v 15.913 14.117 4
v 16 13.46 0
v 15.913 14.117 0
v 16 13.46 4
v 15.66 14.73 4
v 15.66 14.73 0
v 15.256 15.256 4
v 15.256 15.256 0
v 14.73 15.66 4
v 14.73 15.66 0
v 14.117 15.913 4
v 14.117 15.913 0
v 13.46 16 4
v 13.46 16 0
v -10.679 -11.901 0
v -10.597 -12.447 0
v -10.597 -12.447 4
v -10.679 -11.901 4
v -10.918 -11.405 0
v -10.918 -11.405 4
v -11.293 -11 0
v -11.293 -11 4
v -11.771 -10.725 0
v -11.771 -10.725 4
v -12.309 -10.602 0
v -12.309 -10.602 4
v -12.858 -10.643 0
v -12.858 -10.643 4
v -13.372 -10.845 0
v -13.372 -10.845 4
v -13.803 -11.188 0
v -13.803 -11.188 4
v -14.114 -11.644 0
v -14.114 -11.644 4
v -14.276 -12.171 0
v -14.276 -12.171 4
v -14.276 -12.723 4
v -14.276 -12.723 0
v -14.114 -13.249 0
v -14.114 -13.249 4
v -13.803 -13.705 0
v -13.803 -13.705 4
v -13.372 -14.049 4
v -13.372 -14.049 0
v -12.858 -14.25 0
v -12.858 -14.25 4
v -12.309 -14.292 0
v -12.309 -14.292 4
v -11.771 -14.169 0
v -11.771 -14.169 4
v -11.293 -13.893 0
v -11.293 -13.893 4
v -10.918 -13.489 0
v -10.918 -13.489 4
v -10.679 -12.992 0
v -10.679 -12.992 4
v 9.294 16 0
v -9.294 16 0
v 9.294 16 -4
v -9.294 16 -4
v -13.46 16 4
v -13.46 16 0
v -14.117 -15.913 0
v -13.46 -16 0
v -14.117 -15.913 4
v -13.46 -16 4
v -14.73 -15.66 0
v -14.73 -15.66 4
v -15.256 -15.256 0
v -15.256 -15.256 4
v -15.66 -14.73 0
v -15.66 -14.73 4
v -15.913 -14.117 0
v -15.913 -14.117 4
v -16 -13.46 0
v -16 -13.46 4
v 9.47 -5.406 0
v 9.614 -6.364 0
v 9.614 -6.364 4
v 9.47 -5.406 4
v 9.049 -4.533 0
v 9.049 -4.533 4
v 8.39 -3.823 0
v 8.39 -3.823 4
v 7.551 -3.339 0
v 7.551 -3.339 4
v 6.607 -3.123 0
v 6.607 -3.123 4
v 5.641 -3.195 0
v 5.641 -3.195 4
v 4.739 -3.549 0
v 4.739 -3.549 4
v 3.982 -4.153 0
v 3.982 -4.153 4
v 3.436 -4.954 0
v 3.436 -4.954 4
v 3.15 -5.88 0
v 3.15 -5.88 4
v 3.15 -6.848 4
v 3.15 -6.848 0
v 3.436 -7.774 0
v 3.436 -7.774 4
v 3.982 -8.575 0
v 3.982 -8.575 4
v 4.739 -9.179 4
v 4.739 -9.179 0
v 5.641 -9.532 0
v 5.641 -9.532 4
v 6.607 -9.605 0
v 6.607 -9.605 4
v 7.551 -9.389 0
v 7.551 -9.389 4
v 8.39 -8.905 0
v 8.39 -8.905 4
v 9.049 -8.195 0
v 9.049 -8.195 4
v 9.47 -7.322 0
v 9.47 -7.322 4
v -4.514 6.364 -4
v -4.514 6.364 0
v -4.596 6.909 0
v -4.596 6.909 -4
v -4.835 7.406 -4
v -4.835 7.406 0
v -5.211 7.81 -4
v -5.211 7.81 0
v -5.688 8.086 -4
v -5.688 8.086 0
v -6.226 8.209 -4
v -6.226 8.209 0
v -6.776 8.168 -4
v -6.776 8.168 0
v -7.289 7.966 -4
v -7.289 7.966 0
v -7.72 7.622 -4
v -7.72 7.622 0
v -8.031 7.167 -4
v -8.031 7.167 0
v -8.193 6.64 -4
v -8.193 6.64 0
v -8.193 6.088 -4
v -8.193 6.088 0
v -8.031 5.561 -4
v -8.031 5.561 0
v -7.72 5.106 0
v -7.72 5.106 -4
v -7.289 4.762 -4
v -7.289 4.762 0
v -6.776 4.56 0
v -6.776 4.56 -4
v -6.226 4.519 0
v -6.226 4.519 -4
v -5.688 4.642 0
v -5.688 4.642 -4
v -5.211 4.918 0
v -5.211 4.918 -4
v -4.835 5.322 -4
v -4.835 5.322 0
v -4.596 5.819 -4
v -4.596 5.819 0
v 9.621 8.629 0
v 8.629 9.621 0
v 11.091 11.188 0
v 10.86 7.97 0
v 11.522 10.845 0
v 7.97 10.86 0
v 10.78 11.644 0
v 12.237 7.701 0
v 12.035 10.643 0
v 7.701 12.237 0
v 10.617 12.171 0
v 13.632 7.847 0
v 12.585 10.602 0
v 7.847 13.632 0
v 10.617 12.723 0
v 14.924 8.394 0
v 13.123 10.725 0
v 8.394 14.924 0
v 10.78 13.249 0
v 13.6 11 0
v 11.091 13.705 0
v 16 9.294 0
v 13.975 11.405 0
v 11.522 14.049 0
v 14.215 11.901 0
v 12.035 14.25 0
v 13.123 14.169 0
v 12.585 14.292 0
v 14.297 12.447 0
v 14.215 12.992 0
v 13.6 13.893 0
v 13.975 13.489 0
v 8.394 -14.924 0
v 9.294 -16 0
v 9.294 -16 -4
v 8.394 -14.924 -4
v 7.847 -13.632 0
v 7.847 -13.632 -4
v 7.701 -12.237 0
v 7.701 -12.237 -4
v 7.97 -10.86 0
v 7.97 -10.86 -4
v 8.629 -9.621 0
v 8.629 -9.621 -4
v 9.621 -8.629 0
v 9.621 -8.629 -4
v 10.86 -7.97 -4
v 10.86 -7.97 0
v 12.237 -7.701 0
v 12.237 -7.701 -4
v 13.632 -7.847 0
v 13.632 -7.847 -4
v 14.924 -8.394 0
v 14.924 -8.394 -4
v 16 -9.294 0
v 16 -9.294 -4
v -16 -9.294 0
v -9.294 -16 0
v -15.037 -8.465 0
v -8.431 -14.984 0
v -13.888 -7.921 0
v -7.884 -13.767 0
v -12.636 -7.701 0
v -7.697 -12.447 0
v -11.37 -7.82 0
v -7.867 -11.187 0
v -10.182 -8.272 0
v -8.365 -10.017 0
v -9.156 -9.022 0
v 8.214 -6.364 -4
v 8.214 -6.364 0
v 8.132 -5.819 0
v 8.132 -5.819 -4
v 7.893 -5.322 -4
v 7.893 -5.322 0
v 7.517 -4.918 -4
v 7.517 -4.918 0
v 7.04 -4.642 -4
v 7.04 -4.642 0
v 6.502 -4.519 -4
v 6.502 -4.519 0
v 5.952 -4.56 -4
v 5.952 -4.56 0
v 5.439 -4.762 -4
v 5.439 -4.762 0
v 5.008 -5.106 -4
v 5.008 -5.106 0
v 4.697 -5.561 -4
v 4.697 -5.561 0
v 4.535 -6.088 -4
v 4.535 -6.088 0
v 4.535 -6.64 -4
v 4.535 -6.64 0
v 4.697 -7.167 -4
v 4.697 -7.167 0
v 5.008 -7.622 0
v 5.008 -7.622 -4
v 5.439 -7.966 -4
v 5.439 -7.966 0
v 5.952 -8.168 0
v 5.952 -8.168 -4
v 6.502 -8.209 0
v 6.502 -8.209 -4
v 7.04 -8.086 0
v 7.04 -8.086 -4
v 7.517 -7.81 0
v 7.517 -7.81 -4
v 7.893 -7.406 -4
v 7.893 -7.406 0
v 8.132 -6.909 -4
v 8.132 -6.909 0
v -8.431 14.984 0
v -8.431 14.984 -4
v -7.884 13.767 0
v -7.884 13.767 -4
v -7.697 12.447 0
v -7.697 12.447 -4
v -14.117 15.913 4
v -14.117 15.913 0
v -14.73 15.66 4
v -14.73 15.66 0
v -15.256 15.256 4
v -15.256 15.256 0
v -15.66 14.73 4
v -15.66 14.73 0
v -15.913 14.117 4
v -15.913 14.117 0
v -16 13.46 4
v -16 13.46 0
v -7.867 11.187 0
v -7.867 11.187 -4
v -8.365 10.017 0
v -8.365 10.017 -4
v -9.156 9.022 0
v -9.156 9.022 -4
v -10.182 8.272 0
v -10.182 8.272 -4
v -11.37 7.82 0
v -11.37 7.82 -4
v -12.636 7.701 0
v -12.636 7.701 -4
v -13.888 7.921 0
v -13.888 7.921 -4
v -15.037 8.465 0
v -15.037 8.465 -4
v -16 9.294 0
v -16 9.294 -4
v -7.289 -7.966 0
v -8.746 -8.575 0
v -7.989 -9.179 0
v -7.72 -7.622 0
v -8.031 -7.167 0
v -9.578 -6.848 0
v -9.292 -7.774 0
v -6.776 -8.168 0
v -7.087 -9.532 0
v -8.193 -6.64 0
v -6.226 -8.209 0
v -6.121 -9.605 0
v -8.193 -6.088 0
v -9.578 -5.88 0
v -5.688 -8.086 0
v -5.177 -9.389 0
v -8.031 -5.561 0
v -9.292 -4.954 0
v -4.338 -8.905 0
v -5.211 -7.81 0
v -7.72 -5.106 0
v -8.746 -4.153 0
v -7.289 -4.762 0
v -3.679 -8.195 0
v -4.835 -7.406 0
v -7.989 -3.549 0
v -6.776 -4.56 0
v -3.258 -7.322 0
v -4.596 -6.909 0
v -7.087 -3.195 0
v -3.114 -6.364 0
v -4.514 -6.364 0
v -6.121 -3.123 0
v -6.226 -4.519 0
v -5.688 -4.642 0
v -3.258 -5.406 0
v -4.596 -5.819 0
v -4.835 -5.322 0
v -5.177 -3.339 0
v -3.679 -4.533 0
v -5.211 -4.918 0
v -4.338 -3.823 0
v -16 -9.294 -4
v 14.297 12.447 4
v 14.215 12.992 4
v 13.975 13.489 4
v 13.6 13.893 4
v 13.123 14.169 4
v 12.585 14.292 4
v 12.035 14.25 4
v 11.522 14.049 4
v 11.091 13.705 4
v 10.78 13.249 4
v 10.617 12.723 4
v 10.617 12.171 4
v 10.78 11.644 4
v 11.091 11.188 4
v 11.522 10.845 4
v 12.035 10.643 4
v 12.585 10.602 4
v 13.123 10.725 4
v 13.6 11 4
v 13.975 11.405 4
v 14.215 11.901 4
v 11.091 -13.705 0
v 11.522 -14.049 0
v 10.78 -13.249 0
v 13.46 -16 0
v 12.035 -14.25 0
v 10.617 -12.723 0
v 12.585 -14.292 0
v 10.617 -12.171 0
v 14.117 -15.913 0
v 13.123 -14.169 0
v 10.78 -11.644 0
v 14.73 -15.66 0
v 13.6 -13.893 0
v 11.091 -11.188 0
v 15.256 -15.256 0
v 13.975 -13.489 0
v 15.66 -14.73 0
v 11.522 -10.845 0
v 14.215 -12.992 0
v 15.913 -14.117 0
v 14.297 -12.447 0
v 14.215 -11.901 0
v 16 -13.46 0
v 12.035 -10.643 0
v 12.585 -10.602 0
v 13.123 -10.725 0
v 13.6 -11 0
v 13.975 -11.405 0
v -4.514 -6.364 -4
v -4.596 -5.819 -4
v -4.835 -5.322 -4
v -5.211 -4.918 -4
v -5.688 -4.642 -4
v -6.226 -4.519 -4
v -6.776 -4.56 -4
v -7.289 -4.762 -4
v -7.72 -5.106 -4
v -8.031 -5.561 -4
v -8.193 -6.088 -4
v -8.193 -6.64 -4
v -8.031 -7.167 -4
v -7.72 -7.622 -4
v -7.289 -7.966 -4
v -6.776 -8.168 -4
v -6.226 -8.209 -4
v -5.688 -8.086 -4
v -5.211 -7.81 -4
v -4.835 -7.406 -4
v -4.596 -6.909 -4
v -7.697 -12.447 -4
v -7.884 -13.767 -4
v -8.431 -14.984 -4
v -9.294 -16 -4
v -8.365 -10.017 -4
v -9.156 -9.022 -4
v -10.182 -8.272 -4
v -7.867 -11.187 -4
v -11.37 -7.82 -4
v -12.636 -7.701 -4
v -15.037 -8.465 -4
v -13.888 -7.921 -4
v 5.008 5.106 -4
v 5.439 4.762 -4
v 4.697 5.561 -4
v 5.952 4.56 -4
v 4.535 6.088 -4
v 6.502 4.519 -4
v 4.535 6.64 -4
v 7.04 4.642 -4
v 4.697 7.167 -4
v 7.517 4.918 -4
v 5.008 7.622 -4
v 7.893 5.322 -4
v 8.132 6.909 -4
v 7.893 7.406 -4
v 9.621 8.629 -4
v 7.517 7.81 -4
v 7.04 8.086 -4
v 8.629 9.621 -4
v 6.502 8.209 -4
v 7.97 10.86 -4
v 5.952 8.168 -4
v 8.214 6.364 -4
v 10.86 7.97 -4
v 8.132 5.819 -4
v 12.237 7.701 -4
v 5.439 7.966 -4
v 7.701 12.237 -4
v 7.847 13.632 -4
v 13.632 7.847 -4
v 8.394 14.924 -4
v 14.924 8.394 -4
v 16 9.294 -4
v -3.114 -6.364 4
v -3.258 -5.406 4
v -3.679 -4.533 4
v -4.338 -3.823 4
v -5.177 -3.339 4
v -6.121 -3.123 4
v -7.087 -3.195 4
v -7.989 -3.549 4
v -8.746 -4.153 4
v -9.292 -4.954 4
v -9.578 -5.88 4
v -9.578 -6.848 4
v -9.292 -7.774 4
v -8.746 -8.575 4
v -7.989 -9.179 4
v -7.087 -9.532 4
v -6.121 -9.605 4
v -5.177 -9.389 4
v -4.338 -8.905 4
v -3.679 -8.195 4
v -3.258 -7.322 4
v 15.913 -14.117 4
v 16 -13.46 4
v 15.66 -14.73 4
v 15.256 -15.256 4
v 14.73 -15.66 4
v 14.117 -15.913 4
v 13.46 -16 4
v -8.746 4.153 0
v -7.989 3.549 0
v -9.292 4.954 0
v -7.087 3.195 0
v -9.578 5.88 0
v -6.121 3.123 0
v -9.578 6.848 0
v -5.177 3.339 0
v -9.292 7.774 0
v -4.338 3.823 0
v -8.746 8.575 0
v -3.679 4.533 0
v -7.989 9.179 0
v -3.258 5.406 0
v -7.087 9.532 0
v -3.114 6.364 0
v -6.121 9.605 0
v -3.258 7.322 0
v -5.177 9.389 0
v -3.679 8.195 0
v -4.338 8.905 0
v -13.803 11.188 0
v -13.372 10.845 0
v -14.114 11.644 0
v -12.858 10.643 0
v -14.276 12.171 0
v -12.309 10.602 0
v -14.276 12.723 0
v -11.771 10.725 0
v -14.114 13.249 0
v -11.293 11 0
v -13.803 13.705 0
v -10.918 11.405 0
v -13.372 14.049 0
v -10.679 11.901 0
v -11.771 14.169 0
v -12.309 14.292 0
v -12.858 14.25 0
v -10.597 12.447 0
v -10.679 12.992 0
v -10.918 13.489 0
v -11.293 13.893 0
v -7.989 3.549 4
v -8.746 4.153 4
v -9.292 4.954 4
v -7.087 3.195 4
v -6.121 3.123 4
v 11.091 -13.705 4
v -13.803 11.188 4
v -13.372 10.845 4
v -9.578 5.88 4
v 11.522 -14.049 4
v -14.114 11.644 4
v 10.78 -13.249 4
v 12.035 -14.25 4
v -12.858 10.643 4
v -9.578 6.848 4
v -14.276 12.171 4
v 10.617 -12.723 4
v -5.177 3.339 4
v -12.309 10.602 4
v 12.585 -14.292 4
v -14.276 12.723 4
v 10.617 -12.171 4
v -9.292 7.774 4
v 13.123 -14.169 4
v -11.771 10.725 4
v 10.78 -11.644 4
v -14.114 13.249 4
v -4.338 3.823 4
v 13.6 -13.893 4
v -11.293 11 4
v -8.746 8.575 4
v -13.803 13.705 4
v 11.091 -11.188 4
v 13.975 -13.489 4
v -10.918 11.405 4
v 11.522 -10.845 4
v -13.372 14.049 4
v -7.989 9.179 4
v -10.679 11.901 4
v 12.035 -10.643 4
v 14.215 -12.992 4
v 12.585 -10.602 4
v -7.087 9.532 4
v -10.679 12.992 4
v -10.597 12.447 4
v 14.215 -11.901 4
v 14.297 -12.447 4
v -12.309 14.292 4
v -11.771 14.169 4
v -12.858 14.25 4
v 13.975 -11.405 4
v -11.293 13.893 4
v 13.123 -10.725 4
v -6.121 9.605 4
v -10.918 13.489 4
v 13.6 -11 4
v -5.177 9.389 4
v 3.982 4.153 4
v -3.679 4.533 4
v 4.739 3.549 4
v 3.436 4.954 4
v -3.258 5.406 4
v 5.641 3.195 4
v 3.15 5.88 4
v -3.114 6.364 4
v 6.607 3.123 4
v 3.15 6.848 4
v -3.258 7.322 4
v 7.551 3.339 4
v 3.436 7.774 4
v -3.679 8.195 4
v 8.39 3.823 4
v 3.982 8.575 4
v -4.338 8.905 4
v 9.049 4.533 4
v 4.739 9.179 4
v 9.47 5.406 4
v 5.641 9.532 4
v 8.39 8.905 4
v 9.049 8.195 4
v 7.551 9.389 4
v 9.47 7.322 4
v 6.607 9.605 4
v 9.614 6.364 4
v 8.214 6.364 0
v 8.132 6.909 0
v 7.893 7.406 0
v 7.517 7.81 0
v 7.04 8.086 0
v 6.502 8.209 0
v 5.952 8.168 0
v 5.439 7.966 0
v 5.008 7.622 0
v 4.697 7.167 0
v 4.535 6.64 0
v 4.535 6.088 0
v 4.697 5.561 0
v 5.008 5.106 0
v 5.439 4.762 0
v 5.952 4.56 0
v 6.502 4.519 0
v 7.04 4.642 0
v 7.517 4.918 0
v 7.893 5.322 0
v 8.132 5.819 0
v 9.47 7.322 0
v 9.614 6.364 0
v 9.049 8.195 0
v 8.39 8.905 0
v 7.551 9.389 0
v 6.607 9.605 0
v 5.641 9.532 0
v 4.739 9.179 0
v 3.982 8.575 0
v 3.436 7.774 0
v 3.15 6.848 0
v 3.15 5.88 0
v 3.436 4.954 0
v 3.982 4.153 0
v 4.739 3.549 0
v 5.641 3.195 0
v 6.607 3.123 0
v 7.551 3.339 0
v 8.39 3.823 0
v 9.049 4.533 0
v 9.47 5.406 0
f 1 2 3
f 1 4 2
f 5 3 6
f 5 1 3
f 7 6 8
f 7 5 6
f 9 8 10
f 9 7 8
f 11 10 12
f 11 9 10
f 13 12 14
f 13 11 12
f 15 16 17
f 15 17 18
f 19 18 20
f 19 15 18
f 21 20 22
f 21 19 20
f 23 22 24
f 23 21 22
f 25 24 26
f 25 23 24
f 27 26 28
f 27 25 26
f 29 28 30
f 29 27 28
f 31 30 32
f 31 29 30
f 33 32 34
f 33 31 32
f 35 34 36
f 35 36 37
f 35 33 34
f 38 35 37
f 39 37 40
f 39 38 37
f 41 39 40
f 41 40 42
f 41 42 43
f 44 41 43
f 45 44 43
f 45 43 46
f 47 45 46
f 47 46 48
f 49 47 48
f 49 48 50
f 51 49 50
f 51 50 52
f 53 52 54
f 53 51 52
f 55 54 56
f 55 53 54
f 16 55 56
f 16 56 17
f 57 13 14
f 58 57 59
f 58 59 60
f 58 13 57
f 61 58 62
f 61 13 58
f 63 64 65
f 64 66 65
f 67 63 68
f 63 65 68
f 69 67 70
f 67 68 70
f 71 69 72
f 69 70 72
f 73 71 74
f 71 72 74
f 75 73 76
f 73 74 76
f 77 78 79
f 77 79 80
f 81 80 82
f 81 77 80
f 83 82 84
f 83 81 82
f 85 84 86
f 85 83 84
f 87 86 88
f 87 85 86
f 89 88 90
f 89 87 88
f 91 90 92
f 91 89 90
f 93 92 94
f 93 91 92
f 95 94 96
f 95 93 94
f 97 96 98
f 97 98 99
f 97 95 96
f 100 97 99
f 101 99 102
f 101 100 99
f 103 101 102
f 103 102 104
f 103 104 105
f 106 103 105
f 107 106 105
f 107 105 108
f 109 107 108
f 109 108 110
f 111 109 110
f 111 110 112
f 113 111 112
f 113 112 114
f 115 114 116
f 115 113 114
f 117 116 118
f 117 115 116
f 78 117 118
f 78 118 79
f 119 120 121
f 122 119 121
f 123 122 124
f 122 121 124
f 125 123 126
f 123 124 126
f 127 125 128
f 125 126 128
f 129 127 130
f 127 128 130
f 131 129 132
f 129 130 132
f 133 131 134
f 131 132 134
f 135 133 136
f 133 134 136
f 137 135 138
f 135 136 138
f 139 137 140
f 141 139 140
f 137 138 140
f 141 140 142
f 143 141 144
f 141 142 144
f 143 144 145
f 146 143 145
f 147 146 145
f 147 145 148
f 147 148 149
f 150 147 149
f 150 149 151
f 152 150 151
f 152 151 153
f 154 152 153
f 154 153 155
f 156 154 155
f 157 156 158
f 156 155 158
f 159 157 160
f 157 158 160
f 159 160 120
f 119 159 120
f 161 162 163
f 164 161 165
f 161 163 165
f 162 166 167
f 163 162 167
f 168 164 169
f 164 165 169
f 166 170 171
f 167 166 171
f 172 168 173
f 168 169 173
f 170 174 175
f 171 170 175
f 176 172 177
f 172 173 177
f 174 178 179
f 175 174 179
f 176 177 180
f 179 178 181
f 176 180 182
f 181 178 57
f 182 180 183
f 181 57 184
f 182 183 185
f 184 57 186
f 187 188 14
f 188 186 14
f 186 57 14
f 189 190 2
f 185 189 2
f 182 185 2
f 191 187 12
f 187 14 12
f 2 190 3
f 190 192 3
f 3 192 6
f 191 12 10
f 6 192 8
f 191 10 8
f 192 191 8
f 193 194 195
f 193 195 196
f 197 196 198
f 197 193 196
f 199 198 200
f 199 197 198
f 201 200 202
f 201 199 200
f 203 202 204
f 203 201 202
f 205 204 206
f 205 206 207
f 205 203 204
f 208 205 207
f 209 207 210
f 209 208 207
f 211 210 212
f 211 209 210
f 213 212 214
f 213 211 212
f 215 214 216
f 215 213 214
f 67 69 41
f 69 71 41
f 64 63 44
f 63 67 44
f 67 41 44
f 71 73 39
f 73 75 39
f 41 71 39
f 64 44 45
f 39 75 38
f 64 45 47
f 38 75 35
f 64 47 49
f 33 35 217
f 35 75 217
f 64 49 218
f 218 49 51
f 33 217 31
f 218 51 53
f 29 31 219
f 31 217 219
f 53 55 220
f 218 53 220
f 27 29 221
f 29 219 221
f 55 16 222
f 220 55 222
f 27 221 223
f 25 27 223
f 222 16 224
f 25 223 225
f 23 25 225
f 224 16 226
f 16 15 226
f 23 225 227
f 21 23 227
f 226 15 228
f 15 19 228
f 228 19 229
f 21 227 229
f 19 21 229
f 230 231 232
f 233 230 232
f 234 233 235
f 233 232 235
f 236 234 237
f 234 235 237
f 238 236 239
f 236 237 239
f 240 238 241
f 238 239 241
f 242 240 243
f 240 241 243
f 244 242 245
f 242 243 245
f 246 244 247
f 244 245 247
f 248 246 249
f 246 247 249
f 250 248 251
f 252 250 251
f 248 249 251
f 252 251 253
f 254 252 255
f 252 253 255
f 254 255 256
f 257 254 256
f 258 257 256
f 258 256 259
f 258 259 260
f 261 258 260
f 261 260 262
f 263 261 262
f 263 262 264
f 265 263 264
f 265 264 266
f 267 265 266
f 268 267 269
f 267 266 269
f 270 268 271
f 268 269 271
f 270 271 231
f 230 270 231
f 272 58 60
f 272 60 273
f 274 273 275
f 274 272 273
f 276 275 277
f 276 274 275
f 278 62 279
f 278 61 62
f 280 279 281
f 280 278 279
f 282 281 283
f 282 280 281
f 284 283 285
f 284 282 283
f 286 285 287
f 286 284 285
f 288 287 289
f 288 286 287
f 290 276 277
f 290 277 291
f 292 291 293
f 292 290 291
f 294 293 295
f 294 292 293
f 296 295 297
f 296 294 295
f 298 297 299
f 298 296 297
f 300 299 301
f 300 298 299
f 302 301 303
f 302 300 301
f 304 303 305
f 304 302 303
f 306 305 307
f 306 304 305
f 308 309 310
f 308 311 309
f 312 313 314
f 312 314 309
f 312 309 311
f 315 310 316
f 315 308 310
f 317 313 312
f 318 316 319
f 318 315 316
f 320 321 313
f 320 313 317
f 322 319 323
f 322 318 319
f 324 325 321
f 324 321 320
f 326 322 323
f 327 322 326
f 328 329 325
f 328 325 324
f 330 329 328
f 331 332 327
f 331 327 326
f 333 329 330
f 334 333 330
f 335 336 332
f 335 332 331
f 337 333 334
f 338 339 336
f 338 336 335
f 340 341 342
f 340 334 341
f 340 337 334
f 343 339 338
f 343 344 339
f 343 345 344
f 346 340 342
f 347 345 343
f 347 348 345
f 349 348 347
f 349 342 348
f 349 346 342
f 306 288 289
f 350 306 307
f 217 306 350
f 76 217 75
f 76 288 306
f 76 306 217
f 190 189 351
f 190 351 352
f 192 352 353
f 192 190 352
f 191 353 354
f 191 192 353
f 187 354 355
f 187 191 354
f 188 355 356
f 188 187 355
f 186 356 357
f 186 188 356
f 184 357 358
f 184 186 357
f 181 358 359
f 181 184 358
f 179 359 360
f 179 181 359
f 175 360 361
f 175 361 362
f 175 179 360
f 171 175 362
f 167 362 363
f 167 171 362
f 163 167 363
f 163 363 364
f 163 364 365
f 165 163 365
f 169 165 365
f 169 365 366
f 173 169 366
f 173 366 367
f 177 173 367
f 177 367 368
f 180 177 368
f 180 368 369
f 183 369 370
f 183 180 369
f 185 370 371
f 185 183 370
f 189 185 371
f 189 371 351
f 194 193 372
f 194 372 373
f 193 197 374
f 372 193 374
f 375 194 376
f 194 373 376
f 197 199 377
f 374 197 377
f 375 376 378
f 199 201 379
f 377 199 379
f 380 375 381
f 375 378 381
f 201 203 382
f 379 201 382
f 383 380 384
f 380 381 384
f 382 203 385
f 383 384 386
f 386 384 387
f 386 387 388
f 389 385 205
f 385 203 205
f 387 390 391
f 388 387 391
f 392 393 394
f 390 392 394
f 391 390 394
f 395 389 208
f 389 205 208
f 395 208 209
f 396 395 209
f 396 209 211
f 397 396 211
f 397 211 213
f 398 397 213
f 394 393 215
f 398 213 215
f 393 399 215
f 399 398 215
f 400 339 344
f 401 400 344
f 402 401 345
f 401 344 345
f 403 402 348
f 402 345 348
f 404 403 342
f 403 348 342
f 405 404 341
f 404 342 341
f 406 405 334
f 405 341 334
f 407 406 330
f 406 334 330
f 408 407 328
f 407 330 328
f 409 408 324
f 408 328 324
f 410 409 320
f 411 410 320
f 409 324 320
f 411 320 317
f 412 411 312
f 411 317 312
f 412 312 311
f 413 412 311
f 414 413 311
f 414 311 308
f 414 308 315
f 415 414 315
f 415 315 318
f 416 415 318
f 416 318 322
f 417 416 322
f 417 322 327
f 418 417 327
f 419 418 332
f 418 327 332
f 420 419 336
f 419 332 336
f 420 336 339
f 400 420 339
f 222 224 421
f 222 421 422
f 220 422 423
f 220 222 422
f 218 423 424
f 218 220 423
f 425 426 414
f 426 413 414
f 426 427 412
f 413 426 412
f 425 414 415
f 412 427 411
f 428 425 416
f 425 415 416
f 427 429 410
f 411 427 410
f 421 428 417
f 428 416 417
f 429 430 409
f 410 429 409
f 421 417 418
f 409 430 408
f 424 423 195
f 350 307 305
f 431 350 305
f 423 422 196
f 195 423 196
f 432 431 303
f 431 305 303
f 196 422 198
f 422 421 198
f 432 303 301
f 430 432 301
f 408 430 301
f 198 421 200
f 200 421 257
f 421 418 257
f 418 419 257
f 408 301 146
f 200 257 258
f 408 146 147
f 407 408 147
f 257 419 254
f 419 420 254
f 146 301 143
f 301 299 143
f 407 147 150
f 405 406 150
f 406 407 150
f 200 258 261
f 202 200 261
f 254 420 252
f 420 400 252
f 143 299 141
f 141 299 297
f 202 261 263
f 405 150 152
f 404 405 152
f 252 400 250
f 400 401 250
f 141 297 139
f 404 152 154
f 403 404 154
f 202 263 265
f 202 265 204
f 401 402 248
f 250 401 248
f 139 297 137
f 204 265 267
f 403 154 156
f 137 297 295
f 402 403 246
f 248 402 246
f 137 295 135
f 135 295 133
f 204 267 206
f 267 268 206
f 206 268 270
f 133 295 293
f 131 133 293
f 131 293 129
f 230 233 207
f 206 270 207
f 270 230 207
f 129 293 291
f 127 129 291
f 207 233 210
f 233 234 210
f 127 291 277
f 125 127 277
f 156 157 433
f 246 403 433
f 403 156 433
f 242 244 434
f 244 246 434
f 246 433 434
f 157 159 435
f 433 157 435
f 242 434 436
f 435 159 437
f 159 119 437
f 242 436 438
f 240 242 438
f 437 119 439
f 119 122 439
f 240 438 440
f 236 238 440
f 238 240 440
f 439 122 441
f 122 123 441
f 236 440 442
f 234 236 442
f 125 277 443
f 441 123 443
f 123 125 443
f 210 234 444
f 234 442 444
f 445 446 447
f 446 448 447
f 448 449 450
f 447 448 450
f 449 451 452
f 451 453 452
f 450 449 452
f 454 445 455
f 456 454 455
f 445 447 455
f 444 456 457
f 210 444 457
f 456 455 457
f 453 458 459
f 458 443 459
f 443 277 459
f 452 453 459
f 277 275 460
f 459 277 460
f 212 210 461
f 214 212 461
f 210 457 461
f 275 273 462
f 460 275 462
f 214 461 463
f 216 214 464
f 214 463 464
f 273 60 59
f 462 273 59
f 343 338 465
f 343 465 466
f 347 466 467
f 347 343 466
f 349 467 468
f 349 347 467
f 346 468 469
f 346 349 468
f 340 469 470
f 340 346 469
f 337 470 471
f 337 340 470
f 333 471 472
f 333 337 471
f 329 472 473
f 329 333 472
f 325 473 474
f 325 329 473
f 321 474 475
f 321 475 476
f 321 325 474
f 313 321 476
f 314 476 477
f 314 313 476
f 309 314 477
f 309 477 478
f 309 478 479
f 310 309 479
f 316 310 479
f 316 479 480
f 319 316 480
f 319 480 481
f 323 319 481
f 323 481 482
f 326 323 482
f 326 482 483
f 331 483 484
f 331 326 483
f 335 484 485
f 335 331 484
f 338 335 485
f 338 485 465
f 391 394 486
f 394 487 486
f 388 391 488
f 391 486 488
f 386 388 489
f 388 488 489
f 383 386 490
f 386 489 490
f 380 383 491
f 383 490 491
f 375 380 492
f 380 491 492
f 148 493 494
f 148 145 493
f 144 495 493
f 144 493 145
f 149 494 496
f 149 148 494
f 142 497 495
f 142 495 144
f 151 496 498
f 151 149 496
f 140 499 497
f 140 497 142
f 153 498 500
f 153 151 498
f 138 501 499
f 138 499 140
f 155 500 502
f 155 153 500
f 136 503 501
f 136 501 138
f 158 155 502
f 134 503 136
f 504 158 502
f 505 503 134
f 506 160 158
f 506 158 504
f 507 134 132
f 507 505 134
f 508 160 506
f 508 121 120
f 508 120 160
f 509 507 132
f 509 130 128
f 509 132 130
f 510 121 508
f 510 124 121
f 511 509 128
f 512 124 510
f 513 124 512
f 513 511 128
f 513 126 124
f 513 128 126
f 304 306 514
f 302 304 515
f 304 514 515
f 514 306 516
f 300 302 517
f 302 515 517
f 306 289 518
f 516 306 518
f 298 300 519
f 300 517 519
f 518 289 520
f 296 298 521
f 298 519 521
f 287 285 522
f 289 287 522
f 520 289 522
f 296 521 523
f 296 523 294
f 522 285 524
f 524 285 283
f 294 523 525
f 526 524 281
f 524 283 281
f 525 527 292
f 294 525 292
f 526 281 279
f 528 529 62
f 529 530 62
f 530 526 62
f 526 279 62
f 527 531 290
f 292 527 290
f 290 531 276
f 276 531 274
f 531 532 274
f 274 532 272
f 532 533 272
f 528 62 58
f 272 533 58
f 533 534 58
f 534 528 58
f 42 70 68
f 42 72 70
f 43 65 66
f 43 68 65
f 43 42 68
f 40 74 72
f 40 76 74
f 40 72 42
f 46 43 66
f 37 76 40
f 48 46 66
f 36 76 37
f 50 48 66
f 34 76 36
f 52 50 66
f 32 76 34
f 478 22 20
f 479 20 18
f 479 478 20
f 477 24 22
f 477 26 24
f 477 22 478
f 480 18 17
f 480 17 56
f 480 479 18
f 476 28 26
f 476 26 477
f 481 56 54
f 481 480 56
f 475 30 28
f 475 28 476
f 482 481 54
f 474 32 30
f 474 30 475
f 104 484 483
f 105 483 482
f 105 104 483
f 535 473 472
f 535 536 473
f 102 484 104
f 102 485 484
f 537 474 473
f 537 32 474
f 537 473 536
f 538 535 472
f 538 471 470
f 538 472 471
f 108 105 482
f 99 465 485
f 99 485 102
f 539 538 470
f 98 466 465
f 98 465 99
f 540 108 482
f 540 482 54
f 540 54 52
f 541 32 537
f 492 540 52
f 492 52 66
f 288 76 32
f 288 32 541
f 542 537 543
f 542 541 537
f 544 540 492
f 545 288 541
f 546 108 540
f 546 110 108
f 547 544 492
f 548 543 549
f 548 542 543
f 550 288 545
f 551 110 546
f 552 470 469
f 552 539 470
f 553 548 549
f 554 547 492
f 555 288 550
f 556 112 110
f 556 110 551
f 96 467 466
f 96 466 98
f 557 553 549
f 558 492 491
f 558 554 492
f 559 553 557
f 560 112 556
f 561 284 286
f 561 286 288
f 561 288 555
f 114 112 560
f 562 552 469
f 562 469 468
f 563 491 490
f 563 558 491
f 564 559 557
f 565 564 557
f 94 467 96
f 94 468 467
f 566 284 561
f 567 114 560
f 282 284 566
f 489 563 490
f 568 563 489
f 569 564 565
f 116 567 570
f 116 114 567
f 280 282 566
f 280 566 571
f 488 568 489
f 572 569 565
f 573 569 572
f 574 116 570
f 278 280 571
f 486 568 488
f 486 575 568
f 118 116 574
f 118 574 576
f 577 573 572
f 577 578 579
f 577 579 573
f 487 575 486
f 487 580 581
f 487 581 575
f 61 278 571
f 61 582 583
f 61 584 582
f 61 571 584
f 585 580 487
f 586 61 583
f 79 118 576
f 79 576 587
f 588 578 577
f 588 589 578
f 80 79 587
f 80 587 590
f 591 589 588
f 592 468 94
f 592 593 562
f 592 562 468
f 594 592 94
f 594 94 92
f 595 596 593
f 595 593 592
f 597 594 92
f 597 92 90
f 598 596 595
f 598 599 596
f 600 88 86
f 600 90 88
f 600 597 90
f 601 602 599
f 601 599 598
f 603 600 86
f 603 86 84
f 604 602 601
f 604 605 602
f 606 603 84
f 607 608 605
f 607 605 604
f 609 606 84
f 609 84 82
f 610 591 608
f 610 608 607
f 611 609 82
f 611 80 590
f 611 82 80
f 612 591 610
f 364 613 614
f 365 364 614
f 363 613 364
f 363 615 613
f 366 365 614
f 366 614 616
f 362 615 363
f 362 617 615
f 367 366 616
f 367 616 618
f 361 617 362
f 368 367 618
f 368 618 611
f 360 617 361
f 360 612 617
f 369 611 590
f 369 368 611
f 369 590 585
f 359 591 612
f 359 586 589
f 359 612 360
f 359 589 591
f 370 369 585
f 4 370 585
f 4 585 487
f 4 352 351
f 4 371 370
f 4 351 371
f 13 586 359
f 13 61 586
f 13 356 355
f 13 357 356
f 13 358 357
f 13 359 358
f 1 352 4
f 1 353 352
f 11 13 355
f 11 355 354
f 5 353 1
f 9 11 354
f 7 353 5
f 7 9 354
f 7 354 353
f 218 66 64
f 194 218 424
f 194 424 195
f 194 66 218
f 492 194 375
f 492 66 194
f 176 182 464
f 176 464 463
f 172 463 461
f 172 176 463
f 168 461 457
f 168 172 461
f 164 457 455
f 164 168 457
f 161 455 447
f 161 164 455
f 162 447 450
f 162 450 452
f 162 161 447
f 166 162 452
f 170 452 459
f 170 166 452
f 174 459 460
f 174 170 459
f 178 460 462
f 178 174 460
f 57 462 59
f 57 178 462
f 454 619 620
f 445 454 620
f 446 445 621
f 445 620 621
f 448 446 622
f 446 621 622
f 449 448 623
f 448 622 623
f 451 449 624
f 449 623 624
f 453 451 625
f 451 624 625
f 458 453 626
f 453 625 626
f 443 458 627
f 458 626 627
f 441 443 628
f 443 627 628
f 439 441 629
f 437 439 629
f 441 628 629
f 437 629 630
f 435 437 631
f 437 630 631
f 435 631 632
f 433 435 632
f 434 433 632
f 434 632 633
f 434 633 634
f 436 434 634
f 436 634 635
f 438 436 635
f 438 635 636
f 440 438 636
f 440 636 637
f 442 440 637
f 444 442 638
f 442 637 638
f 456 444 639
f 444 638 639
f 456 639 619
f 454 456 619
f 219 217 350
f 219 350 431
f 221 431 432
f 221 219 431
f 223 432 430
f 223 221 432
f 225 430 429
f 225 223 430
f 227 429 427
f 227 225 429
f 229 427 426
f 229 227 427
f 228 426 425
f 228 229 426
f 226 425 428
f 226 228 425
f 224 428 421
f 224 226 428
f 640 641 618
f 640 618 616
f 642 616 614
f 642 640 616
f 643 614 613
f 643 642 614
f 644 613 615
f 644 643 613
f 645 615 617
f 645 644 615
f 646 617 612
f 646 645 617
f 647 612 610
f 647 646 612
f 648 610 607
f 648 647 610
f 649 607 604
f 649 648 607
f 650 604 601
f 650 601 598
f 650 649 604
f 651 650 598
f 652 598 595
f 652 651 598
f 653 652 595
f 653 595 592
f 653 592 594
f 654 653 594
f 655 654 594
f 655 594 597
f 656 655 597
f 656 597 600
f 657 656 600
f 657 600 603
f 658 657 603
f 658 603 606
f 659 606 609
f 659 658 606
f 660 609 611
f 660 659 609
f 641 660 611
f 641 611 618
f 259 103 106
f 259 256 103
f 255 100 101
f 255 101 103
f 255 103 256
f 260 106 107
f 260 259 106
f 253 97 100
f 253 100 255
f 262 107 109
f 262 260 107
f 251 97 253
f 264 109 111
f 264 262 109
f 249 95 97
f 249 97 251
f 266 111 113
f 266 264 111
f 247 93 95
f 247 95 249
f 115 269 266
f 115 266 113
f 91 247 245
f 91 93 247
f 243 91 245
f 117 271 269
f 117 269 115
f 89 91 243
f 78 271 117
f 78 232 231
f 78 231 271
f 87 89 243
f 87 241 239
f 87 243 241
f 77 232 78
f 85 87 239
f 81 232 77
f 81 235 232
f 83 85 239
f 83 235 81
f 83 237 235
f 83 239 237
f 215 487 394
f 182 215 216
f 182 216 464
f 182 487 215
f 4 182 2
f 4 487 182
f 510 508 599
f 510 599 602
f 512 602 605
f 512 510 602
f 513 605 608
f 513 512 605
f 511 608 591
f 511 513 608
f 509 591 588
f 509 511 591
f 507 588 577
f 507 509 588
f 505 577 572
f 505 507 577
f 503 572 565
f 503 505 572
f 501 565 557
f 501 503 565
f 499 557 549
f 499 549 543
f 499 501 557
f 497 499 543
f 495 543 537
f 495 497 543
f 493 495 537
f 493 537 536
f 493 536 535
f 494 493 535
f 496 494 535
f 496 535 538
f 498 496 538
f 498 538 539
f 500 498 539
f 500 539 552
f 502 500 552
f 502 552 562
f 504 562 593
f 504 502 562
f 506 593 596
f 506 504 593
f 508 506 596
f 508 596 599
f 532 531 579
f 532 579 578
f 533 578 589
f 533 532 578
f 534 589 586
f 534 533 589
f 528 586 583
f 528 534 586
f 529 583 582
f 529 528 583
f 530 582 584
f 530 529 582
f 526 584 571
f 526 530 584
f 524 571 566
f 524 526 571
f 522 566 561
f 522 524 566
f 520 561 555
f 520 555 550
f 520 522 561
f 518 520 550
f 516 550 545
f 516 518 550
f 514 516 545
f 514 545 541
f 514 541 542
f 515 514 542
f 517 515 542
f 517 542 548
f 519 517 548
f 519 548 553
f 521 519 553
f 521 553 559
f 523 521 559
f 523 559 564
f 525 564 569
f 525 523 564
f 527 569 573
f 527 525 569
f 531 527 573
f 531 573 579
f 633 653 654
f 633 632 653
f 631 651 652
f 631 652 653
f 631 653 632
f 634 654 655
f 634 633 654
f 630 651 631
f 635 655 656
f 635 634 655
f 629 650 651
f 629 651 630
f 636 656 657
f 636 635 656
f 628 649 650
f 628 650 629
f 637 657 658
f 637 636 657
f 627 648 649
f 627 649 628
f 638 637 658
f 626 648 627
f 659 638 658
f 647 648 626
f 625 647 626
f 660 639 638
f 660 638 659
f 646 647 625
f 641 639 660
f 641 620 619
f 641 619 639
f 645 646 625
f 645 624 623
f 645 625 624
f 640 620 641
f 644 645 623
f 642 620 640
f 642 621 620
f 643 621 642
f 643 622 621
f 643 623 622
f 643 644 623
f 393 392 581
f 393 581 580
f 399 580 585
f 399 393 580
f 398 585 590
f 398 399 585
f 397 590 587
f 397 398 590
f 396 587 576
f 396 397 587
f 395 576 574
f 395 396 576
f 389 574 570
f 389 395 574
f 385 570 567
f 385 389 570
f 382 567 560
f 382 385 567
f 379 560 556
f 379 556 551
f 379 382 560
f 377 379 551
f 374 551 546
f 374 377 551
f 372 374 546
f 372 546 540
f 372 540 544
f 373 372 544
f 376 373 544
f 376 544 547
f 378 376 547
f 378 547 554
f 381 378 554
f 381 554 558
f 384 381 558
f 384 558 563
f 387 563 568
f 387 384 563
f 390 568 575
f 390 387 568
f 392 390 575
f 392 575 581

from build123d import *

# Parameters (mm, degrees)
F0_R     = 3.25
F0_R_2   = 1.85
F1_DEPTH = 4
F2_DEPTH = 4
F3_R     = 2.54


with BuildPart() as f1:
    # F0 (on Top) → F1 (new body)
    with BuildSketch(Plane.XY):
        with BuildLine():
            ThreePointArc((16, 9.294458), (9.088031, 9.088031), (9.294458, 16))
            Line((9.294458, 16), (-9.294458, 16))
            ThreePointArc((-9.294458, 16), (-8.114579, 14.394727), (-7.696788, 12.446788))
            ThreePointArc((-7.696788, 12.446788), (-10.760855, 8.006053), (-16, 9.294458))
            Line((-16, 9.294458), (-16, -9.294458))
            ThreePointArc((-16, -9.294458), (-10.760855, -8.006053), (-7.696788, -12.446788))
            ThreePointArc((-7.696788, -12.446788), (-8.114579, -14.394727), (-9.294458, -16))
            Line((-9.294458, -16), (9.294458, -16))
            ThreePointArc((9.294458, -16), (9.088031, -9.088031), (16, -9.294458))
            Line((16, -9.294458), (16, 9.294458))
        make_face()
        with Locations((-6.363961, -6.363961)):
            Circle(F0_R, mode=Mode.SUBTRACT)
        with Locations((6.363961, -6.363961)):
            Circle(F0_R, mode=Mode.SUBTRACT)
        with Locations((-6.363961, 6.363961)):
            Circle(F0_R, mode=Mode.SUBTRACT)
        with Locations((6.363961, 6.363961)):
            Circle(F0_R, mode=Mode.SUBTRACT)
        with BuildLine():
            ThreePointArc((-7.696788, 12.446788), (-8.114579, 14.394727), (-9.294458, 16))
            Line((-9.294458, 16), (-15.599119, 16))
            ThreePointArc((-15.599119, 16), (-15.805546, 15.805546), (-16, 15.599119))
            Line((-16, 15.599119), (-16, 9.294458))
            ThreePointArc((-16, 9.294458), (-10.760855, 8.006053), (-7.696788, 12.446788))
        make_face()
        with Locations((-12.446788, 12.446788)):
            Circle(F0_R_2, mode=Mode.SUBTRACT)
        with BuildLine():
            ThreePointArc((16, 15.599119), (15.805546, 15.805546), (15.599119, 16))
            Line((15.599119, 16), (9.294458, 16))
            ThreePointArc((9.294458, 16), (9.088031, 9.088031), (16, 9.294458))
            Line((16, 9.294458), (16, 15.599119))
        make_face()
        with Locations((12.446788, 12.446788)):
            Circle(F0_R_2, mode=Mode.SUBTRACT)
        with BuildLine():
            Line((16, -15.599119), (16, -9.294458))
            ThreePointArc((16, -9.294458), (9.088031, -9.088031), (9.294458, -16))
            Line((9.294458, -16), (15.599119, -16))
            ThreePointArc((15.599119, -16), (15.805546, -15.805546), (16, -15.599119))
        make_face()
        with Locations((12.446788, -12.446788)):
            Circle(F0_R_2, mode=Mode.SUBTRACT)
        with BuildLine():
            Line((-15.599119, -16), (-9.294458, -16))
            ThreePointArc((-9.294458, -16), (-8.114579, -14.394727), (-7.696788, -12.446788))
            ThreePointArc((-7.696788, -12.446788), (-10.760855, -8.006053), (-16, -9.294458))
            Line((-16, -9.294458), (-16, -15.599119))
            ThreePointArc((-16, -15.599119), (-15.805546, -15.805546), (-15.599119, -16))
        make_face()
        with Locations((-12.446788, -12.446788)):
            Circle(F0_R_2, mode=Mode.SUBTRACT)
        with BuildLine():
            ThreePointArc((-16, 15.599119), (-15.805546, 15.805546), (-15.599119, 16))
            Line((-15.599119, 16), (-16, 16))
            Line((-16, 16), (-16, 15.599119))
        make_face()
        with BuildLine():
            Line((16, 15.599119), (16, 16))
            Line((16, 16), (15.599119, 16))
            ThreePointArc((15.599119, 16), (15.805546, 15.805546), (16, 15.599119))
        make_face()
        with BuildLine():
            Line((16, -16), (16, -15.599119))
            ThreePointArc((16, -15.599119), (15.805546, -15.805546), (15.599119, -16))
            Line((15.599119, -16), (16, -16))
        make_face()
        with BuildLine():
            Line((-16, -16), (-15.599119, -16))
            ThreePointArc((-15.599119, -16), (-15.805546, -15.805546), (-16, -15.599119))
            Line((-16, -15.599119), (-16, -16))
        make_face()
    extrude(amount=F1_DEPTH)

    # F0 (on Top) → F2 (join)
    with BuildSketch(Plane.XY):
        with BuildLine():
            ThreePointArc((16, 9.294458), (9.088031, 9.088031), (9.294458, 16))
            Line((9.294458, 16), (-9.294458, 16))
            ThreePointArc((-9.294458, 16), (-8.114579, 14.394727), (-7.696788, 12.446788))
            ThreePointArc((-7.696788, 12.446788), (-10.760855, 8.006053), (-16, 9.294458))
            Line((-16, 9.294458), (-16, -9.294458))
            ThreePointArc((-16, -9.294458), (-10.760855, -8.006053), (-7.696788, -12.446788))
            ThreePointArc((-7.696788, -12.446788), (-8.114579, -14.394727), (-9.294458, -16))
            Line((-9.294458, -16), (9.294458, -16))
            ThreePointArc((9.294458, -16), (9.088031, -9.088031), (16, -9.294458))
            Line((16, -9.294458), (16, 9.294458))
        make_face()
        with Locations((-6.363961, -6.363961)):
            Circle(F0_R, mode=Mode.SUBTRACT)
        with Locations((6.363961, -6.363961)):
            Circle(F0_R, mode=Mode.SUBTRACT)
        with Locations((-6.363961, 6.363961)):
            Circle(F0_R, mode=Mode.SUBTRACT)
        with Locations((6.363961, 6.363961)):
            Circle(F0_R, mode=Mode.SUBTRACT)
        with Locations((-6.363961, -6.363961)):
            Circle(F0_R)
        with Locations((-6.363961, -6.363961)):
            Circle(F0_R_2, mode=Mode.SUBTRACT)
        with Locations((6.363961, -6.363961)):
            Circle(F0_R)
        with Locations((6.363961, -6.363961)):
            Circle(F0_R_2, mode=Mode.SUBTRACT)
        with Locations((6.363961, 6.363961)):
            Circle(F0_R)
        with Locations((6.363961, 6.363961)):
            Circle(F0_R_2, mode=Mode.SUBTRACT)
        with Locations((-6.363961, 6.363961)):
            Circle(F0_R)
        with Locations((-6.363961, 6.363961)):
            Circle(F0_R_2, mode=Mode.SUBTRACT)
    extrude(amount=-F2_DEPTH)

    # F3
    f3_edges = [f1.edges().sort_by_distance(p)[0] for p in [
        (16, 16, 2),
        (-16, 16, 2),
        (-16, -16, 2),
        (16, -16, 2),
    ]]
    fillet(f3_edges, radius=F3_R)


solid = f1.part
